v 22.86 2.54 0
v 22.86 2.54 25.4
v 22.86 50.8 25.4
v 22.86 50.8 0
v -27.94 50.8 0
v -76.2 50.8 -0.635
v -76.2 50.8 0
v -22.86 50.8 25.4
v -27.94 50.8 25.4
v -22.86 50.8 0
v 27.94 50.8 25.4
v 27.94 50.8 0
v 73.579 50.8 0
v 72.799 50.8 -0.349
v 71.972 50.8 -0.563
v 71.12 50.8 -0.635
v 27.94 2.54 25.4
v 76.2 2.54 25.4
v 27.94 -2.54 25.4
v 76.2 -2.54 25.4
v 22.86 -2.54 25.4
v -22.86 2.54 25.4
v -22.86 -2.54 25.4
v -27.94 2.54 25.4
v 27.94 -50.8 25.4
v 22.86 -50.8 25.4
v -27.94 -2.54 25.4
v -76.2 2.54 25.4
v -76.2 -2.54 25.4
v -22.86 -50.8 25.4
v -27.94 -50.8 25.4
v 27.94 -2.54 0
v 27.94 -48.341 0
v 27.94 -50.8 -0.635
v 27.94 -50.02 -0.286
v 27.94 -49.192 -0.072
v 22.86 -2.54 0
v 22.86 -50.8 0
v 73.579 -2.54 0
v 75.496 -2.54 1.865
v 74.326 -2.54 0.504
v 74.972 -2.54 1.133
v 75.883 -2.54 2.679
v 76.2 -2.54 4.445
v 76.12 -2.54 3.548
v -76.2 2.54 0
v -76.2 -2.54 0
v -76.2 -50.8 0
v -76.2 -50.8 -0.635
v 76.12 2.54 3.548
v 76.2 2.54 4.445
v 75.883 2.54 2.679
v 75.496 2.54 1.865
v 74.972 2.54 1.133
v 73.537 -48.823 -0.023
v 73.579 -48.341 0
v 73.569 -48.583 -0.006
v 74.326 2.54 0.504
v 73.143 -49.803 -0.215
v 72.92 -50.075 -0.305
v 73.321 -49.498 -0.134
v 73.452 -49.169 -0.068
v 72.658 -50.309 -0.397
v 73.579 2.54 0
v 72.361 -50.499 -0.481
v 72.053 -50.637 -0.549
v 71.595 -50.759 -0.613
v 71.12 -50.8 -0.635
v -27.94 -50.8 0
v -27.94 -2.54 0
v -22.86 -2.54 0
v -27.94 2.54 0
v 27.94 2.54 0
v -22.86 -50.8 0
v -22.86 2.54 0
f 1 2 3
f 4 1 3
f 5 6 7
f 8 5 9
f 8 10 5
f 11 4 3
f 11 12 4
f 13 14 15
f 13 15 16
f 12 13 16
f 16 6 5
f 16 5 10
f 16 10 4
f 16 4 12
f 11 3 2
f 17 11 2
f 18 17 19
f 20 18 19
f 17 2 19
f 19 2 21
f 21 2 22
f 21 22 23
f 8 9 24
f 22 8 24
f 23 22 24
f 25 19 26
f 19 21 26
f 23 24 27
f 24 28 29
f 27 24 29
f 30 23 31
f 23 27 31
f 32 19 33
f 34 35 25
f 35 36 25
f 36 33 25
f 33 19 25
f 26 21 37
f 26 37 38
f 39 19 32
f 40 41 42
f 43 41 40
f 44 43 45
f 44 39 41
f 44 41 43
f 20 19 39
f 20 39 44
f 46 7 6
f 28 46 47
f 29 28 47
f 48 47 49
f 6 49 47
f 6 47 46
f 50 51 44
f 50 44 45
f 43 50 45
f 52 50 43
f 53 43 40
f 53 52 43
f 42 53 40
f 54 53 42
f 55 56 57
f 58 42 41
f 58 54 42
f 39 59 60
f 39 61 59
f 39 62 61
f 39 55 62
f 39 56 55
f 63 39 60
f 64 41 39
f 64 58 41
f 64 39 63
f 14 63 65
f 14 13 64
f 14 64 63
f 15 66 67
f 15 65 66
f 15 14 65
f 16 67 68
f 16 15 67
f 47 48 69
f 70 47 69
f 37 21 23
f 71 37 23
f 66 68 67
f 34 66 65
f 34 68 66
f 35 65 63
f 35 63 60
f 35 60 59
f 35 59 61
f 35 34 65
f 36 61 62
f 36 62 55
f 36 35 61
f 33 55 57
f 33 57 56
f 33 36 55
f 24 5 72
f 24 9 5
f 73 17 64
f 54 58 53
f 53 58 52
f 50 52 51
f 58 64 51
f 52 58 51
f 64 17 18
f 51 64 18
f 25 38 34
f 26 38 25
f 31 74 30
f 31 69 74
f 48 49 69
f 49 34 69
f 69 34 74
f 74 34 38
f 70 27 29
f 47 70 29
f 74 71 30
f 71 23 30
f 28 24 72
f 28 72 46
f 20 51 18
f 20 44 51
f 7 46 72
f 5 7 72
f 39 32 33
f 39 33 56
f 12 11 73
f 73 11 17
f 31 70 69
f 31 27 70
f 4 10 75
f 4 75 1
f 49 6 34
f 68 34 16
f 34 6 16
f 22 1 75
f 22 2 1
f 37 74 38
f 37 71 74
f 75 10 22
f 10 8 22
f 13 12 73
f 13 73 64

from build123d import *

# Parameters (mm, degrees)
F0_W         = 50.8
F0_H         = 50.8
F16_DEPTH    = 0.635
F13_E4_W     = 50.8
F13_E4_H     = 25.4
F17_DEPTH    = 2.54
F11_E6_W     = 50.8
F11_E6_H     = 25.4
F11_E5_W     = 50.8
F11_E5_H     = 25.4
F18_DEPTH    = 2.54
F9_E0_W      = 25.4
F9_E0_H      = 25.4
F9_E3_W      = 25.4
F9_E3_H      = 25.4
F19_DEPTH    = 2.54
F7_E7_W      = 50.8
F7_E7_H      = 25.4
F20_DEPTH    = 2.54
F3_E1_W      = 50.8
F3_E1_H      = 25.4
F21_DEPTH    = 2.54
F1_E2_W      = 50.8
F1_E2_H      = 25.4
F22_DEPTH    = 2.54
F23_R        = 5.08
F24_T1_DEPTH = 51.7877054869


# Not quite as in the source:
# - a fillet or chamfer that OpenCascade refuses, or shapes differently, is made with other operations: its cross-section is extruded or revolved along the edge and cut away or added
# - the program builds the solid bodies; features that only make, move or delete a surface that nothing else refers to are left out


with BuildPart() as f16:
    # F0 (on Top) → F16 (new body)
    with BuildSketch(Plane.XY):
        Polygon((-25.4, 0), (0, 0), (25.4, 0), (25.4, 50.8), (-25.4, 50.8), align=None)
        Polygon((25.4, 0), (0, 0), (-25.4, 0), (-25.4, -50.8), (25.4, -50.8), align=None)
        with Locations((50.8, -25.4)):
            Rectangle(F0_W, F0_H)
        with Locations((50.8, 25.4)):
            Rectangle(F0_W, F0_H)
        with Locations((-50.8, -25.4)):
            Rectangle(F0_W, F0_H)
        with Locations((-50.8, 25.4)):
            Rectangle(F0_W, F0_H)
    extrude(amount=-F16_DEPTH)

    # F13_E4 (on explicit) → F17 (join, symmetric)
    with BuildSketch(Plane(origin=(-25.4, 0, 0), x_dir=(-1, 0, 0), z_dir=(0, 1, 0))):
        with Locations((25.4, 12.7)):
            Rectangle(F13_E4_W, F13_E4_H)
    extrude(amount=F17_DEPTH, both=True)

    # F11_E6 (on explicit) + F11_E5 (on explicit) → F18 (join, symmetric)
    with BuildSketch(Plane.YZ.offset(-25.4)):
        with Locations((25.4, 12.7)):
            Rectangle(F11_E6_W, F11_E6_H)
    with BuildSketch(Plane(origin=(-25.4, 0, 0), x_dir=(0, -1, 0), z_dir=(-1, 0, 0))):
        with Locations((25.4, 12.7)):
            Rectangle(F11_E5_W, F11_E5_H)
    extrude(amount=F18_DEPTH, both=True, dir=(1, 0, 0))

    # F9_E0 (on explicit) + F9_E3 (on explicit) → F19 (join, symmetric)
    with BuildSketch(Plane.XZ):
        with Locations((12.7, 12.7)):
            Rectangle(F9_E0_W, F9_E0_H)
    with BuildSketch(Plane(origin=(0, 0, 0), x_dir=(-1, 0, 0), z_dir=(0, 1, 0))):
        with Locations((12.7, 12.7)):
            Rectangle(F9_E3_W, F9_E3_H)
    extrude(amount=F19_DEPTH, both=True, dir=(0, -1, 0))

    # F7_E7 (on explicit) → F20 (join, symmetric)
    with BuildSketch(Plane.YZ.offset(25.4)):
        with Locations((25.4, 12.7)):
            Rectangle(F7_E7_W, F7_E7_H)
    extrude(amount=F20_DEPTH, both=True)

    # F3_E1 (on explicit) → F21 (join, symmetric)
    with BuildSketch(Plane(origin=(25.4, 0, 0), x_dir=(0, -1, 0), z_dir=(-1, 0, 0))):
        with Locations((25.4, 12.7)):
            Rectangle(F3_E1_W, F3_E1_H)
    extrude(amount=F21_DEPTH, both=True)

    # F1_E2 (on explicit) → F22 (join, symmetric)
    with BuildSketch(Plane(origin=(25.4, 0, 0), x_dir=(1, 0, 0), z_dir=(0, -1, 0))):
        with Locations((25.4, 12.7)):
            Rectangle(F1_E2_W, F1_E2_H)
    extrude(amount=F22_DEPTH, both=True)

    # F23
    f23_edges = [f16.edges().sort_by_distance(p)[0] for p in [
        (76.2, 0, -0.635),
    ]]
    fillet(f23_edges, radius=F23_R)

    # F24: fillet of radius 5.08 on 1 edges, made by hand

    # F24_s2 → F24_t1 (cut)
    with BuildSketch(Plane.YZ.offset(27.94)):
        with BuildLine():
            ThreePointArc((-50.8, -0.635), (-49.6106555752, -0.1613111503), (-48.3406555752, 0))
            Line((-48.3406555752, 0), (-50.8, 0))
            Line((-50.8, 0), (-50.8, -0.635))
        make_face()
    extrude(amount=F24_T1_DEPTH, mode=Mode.SUBTRACT)


solid = f16.part
